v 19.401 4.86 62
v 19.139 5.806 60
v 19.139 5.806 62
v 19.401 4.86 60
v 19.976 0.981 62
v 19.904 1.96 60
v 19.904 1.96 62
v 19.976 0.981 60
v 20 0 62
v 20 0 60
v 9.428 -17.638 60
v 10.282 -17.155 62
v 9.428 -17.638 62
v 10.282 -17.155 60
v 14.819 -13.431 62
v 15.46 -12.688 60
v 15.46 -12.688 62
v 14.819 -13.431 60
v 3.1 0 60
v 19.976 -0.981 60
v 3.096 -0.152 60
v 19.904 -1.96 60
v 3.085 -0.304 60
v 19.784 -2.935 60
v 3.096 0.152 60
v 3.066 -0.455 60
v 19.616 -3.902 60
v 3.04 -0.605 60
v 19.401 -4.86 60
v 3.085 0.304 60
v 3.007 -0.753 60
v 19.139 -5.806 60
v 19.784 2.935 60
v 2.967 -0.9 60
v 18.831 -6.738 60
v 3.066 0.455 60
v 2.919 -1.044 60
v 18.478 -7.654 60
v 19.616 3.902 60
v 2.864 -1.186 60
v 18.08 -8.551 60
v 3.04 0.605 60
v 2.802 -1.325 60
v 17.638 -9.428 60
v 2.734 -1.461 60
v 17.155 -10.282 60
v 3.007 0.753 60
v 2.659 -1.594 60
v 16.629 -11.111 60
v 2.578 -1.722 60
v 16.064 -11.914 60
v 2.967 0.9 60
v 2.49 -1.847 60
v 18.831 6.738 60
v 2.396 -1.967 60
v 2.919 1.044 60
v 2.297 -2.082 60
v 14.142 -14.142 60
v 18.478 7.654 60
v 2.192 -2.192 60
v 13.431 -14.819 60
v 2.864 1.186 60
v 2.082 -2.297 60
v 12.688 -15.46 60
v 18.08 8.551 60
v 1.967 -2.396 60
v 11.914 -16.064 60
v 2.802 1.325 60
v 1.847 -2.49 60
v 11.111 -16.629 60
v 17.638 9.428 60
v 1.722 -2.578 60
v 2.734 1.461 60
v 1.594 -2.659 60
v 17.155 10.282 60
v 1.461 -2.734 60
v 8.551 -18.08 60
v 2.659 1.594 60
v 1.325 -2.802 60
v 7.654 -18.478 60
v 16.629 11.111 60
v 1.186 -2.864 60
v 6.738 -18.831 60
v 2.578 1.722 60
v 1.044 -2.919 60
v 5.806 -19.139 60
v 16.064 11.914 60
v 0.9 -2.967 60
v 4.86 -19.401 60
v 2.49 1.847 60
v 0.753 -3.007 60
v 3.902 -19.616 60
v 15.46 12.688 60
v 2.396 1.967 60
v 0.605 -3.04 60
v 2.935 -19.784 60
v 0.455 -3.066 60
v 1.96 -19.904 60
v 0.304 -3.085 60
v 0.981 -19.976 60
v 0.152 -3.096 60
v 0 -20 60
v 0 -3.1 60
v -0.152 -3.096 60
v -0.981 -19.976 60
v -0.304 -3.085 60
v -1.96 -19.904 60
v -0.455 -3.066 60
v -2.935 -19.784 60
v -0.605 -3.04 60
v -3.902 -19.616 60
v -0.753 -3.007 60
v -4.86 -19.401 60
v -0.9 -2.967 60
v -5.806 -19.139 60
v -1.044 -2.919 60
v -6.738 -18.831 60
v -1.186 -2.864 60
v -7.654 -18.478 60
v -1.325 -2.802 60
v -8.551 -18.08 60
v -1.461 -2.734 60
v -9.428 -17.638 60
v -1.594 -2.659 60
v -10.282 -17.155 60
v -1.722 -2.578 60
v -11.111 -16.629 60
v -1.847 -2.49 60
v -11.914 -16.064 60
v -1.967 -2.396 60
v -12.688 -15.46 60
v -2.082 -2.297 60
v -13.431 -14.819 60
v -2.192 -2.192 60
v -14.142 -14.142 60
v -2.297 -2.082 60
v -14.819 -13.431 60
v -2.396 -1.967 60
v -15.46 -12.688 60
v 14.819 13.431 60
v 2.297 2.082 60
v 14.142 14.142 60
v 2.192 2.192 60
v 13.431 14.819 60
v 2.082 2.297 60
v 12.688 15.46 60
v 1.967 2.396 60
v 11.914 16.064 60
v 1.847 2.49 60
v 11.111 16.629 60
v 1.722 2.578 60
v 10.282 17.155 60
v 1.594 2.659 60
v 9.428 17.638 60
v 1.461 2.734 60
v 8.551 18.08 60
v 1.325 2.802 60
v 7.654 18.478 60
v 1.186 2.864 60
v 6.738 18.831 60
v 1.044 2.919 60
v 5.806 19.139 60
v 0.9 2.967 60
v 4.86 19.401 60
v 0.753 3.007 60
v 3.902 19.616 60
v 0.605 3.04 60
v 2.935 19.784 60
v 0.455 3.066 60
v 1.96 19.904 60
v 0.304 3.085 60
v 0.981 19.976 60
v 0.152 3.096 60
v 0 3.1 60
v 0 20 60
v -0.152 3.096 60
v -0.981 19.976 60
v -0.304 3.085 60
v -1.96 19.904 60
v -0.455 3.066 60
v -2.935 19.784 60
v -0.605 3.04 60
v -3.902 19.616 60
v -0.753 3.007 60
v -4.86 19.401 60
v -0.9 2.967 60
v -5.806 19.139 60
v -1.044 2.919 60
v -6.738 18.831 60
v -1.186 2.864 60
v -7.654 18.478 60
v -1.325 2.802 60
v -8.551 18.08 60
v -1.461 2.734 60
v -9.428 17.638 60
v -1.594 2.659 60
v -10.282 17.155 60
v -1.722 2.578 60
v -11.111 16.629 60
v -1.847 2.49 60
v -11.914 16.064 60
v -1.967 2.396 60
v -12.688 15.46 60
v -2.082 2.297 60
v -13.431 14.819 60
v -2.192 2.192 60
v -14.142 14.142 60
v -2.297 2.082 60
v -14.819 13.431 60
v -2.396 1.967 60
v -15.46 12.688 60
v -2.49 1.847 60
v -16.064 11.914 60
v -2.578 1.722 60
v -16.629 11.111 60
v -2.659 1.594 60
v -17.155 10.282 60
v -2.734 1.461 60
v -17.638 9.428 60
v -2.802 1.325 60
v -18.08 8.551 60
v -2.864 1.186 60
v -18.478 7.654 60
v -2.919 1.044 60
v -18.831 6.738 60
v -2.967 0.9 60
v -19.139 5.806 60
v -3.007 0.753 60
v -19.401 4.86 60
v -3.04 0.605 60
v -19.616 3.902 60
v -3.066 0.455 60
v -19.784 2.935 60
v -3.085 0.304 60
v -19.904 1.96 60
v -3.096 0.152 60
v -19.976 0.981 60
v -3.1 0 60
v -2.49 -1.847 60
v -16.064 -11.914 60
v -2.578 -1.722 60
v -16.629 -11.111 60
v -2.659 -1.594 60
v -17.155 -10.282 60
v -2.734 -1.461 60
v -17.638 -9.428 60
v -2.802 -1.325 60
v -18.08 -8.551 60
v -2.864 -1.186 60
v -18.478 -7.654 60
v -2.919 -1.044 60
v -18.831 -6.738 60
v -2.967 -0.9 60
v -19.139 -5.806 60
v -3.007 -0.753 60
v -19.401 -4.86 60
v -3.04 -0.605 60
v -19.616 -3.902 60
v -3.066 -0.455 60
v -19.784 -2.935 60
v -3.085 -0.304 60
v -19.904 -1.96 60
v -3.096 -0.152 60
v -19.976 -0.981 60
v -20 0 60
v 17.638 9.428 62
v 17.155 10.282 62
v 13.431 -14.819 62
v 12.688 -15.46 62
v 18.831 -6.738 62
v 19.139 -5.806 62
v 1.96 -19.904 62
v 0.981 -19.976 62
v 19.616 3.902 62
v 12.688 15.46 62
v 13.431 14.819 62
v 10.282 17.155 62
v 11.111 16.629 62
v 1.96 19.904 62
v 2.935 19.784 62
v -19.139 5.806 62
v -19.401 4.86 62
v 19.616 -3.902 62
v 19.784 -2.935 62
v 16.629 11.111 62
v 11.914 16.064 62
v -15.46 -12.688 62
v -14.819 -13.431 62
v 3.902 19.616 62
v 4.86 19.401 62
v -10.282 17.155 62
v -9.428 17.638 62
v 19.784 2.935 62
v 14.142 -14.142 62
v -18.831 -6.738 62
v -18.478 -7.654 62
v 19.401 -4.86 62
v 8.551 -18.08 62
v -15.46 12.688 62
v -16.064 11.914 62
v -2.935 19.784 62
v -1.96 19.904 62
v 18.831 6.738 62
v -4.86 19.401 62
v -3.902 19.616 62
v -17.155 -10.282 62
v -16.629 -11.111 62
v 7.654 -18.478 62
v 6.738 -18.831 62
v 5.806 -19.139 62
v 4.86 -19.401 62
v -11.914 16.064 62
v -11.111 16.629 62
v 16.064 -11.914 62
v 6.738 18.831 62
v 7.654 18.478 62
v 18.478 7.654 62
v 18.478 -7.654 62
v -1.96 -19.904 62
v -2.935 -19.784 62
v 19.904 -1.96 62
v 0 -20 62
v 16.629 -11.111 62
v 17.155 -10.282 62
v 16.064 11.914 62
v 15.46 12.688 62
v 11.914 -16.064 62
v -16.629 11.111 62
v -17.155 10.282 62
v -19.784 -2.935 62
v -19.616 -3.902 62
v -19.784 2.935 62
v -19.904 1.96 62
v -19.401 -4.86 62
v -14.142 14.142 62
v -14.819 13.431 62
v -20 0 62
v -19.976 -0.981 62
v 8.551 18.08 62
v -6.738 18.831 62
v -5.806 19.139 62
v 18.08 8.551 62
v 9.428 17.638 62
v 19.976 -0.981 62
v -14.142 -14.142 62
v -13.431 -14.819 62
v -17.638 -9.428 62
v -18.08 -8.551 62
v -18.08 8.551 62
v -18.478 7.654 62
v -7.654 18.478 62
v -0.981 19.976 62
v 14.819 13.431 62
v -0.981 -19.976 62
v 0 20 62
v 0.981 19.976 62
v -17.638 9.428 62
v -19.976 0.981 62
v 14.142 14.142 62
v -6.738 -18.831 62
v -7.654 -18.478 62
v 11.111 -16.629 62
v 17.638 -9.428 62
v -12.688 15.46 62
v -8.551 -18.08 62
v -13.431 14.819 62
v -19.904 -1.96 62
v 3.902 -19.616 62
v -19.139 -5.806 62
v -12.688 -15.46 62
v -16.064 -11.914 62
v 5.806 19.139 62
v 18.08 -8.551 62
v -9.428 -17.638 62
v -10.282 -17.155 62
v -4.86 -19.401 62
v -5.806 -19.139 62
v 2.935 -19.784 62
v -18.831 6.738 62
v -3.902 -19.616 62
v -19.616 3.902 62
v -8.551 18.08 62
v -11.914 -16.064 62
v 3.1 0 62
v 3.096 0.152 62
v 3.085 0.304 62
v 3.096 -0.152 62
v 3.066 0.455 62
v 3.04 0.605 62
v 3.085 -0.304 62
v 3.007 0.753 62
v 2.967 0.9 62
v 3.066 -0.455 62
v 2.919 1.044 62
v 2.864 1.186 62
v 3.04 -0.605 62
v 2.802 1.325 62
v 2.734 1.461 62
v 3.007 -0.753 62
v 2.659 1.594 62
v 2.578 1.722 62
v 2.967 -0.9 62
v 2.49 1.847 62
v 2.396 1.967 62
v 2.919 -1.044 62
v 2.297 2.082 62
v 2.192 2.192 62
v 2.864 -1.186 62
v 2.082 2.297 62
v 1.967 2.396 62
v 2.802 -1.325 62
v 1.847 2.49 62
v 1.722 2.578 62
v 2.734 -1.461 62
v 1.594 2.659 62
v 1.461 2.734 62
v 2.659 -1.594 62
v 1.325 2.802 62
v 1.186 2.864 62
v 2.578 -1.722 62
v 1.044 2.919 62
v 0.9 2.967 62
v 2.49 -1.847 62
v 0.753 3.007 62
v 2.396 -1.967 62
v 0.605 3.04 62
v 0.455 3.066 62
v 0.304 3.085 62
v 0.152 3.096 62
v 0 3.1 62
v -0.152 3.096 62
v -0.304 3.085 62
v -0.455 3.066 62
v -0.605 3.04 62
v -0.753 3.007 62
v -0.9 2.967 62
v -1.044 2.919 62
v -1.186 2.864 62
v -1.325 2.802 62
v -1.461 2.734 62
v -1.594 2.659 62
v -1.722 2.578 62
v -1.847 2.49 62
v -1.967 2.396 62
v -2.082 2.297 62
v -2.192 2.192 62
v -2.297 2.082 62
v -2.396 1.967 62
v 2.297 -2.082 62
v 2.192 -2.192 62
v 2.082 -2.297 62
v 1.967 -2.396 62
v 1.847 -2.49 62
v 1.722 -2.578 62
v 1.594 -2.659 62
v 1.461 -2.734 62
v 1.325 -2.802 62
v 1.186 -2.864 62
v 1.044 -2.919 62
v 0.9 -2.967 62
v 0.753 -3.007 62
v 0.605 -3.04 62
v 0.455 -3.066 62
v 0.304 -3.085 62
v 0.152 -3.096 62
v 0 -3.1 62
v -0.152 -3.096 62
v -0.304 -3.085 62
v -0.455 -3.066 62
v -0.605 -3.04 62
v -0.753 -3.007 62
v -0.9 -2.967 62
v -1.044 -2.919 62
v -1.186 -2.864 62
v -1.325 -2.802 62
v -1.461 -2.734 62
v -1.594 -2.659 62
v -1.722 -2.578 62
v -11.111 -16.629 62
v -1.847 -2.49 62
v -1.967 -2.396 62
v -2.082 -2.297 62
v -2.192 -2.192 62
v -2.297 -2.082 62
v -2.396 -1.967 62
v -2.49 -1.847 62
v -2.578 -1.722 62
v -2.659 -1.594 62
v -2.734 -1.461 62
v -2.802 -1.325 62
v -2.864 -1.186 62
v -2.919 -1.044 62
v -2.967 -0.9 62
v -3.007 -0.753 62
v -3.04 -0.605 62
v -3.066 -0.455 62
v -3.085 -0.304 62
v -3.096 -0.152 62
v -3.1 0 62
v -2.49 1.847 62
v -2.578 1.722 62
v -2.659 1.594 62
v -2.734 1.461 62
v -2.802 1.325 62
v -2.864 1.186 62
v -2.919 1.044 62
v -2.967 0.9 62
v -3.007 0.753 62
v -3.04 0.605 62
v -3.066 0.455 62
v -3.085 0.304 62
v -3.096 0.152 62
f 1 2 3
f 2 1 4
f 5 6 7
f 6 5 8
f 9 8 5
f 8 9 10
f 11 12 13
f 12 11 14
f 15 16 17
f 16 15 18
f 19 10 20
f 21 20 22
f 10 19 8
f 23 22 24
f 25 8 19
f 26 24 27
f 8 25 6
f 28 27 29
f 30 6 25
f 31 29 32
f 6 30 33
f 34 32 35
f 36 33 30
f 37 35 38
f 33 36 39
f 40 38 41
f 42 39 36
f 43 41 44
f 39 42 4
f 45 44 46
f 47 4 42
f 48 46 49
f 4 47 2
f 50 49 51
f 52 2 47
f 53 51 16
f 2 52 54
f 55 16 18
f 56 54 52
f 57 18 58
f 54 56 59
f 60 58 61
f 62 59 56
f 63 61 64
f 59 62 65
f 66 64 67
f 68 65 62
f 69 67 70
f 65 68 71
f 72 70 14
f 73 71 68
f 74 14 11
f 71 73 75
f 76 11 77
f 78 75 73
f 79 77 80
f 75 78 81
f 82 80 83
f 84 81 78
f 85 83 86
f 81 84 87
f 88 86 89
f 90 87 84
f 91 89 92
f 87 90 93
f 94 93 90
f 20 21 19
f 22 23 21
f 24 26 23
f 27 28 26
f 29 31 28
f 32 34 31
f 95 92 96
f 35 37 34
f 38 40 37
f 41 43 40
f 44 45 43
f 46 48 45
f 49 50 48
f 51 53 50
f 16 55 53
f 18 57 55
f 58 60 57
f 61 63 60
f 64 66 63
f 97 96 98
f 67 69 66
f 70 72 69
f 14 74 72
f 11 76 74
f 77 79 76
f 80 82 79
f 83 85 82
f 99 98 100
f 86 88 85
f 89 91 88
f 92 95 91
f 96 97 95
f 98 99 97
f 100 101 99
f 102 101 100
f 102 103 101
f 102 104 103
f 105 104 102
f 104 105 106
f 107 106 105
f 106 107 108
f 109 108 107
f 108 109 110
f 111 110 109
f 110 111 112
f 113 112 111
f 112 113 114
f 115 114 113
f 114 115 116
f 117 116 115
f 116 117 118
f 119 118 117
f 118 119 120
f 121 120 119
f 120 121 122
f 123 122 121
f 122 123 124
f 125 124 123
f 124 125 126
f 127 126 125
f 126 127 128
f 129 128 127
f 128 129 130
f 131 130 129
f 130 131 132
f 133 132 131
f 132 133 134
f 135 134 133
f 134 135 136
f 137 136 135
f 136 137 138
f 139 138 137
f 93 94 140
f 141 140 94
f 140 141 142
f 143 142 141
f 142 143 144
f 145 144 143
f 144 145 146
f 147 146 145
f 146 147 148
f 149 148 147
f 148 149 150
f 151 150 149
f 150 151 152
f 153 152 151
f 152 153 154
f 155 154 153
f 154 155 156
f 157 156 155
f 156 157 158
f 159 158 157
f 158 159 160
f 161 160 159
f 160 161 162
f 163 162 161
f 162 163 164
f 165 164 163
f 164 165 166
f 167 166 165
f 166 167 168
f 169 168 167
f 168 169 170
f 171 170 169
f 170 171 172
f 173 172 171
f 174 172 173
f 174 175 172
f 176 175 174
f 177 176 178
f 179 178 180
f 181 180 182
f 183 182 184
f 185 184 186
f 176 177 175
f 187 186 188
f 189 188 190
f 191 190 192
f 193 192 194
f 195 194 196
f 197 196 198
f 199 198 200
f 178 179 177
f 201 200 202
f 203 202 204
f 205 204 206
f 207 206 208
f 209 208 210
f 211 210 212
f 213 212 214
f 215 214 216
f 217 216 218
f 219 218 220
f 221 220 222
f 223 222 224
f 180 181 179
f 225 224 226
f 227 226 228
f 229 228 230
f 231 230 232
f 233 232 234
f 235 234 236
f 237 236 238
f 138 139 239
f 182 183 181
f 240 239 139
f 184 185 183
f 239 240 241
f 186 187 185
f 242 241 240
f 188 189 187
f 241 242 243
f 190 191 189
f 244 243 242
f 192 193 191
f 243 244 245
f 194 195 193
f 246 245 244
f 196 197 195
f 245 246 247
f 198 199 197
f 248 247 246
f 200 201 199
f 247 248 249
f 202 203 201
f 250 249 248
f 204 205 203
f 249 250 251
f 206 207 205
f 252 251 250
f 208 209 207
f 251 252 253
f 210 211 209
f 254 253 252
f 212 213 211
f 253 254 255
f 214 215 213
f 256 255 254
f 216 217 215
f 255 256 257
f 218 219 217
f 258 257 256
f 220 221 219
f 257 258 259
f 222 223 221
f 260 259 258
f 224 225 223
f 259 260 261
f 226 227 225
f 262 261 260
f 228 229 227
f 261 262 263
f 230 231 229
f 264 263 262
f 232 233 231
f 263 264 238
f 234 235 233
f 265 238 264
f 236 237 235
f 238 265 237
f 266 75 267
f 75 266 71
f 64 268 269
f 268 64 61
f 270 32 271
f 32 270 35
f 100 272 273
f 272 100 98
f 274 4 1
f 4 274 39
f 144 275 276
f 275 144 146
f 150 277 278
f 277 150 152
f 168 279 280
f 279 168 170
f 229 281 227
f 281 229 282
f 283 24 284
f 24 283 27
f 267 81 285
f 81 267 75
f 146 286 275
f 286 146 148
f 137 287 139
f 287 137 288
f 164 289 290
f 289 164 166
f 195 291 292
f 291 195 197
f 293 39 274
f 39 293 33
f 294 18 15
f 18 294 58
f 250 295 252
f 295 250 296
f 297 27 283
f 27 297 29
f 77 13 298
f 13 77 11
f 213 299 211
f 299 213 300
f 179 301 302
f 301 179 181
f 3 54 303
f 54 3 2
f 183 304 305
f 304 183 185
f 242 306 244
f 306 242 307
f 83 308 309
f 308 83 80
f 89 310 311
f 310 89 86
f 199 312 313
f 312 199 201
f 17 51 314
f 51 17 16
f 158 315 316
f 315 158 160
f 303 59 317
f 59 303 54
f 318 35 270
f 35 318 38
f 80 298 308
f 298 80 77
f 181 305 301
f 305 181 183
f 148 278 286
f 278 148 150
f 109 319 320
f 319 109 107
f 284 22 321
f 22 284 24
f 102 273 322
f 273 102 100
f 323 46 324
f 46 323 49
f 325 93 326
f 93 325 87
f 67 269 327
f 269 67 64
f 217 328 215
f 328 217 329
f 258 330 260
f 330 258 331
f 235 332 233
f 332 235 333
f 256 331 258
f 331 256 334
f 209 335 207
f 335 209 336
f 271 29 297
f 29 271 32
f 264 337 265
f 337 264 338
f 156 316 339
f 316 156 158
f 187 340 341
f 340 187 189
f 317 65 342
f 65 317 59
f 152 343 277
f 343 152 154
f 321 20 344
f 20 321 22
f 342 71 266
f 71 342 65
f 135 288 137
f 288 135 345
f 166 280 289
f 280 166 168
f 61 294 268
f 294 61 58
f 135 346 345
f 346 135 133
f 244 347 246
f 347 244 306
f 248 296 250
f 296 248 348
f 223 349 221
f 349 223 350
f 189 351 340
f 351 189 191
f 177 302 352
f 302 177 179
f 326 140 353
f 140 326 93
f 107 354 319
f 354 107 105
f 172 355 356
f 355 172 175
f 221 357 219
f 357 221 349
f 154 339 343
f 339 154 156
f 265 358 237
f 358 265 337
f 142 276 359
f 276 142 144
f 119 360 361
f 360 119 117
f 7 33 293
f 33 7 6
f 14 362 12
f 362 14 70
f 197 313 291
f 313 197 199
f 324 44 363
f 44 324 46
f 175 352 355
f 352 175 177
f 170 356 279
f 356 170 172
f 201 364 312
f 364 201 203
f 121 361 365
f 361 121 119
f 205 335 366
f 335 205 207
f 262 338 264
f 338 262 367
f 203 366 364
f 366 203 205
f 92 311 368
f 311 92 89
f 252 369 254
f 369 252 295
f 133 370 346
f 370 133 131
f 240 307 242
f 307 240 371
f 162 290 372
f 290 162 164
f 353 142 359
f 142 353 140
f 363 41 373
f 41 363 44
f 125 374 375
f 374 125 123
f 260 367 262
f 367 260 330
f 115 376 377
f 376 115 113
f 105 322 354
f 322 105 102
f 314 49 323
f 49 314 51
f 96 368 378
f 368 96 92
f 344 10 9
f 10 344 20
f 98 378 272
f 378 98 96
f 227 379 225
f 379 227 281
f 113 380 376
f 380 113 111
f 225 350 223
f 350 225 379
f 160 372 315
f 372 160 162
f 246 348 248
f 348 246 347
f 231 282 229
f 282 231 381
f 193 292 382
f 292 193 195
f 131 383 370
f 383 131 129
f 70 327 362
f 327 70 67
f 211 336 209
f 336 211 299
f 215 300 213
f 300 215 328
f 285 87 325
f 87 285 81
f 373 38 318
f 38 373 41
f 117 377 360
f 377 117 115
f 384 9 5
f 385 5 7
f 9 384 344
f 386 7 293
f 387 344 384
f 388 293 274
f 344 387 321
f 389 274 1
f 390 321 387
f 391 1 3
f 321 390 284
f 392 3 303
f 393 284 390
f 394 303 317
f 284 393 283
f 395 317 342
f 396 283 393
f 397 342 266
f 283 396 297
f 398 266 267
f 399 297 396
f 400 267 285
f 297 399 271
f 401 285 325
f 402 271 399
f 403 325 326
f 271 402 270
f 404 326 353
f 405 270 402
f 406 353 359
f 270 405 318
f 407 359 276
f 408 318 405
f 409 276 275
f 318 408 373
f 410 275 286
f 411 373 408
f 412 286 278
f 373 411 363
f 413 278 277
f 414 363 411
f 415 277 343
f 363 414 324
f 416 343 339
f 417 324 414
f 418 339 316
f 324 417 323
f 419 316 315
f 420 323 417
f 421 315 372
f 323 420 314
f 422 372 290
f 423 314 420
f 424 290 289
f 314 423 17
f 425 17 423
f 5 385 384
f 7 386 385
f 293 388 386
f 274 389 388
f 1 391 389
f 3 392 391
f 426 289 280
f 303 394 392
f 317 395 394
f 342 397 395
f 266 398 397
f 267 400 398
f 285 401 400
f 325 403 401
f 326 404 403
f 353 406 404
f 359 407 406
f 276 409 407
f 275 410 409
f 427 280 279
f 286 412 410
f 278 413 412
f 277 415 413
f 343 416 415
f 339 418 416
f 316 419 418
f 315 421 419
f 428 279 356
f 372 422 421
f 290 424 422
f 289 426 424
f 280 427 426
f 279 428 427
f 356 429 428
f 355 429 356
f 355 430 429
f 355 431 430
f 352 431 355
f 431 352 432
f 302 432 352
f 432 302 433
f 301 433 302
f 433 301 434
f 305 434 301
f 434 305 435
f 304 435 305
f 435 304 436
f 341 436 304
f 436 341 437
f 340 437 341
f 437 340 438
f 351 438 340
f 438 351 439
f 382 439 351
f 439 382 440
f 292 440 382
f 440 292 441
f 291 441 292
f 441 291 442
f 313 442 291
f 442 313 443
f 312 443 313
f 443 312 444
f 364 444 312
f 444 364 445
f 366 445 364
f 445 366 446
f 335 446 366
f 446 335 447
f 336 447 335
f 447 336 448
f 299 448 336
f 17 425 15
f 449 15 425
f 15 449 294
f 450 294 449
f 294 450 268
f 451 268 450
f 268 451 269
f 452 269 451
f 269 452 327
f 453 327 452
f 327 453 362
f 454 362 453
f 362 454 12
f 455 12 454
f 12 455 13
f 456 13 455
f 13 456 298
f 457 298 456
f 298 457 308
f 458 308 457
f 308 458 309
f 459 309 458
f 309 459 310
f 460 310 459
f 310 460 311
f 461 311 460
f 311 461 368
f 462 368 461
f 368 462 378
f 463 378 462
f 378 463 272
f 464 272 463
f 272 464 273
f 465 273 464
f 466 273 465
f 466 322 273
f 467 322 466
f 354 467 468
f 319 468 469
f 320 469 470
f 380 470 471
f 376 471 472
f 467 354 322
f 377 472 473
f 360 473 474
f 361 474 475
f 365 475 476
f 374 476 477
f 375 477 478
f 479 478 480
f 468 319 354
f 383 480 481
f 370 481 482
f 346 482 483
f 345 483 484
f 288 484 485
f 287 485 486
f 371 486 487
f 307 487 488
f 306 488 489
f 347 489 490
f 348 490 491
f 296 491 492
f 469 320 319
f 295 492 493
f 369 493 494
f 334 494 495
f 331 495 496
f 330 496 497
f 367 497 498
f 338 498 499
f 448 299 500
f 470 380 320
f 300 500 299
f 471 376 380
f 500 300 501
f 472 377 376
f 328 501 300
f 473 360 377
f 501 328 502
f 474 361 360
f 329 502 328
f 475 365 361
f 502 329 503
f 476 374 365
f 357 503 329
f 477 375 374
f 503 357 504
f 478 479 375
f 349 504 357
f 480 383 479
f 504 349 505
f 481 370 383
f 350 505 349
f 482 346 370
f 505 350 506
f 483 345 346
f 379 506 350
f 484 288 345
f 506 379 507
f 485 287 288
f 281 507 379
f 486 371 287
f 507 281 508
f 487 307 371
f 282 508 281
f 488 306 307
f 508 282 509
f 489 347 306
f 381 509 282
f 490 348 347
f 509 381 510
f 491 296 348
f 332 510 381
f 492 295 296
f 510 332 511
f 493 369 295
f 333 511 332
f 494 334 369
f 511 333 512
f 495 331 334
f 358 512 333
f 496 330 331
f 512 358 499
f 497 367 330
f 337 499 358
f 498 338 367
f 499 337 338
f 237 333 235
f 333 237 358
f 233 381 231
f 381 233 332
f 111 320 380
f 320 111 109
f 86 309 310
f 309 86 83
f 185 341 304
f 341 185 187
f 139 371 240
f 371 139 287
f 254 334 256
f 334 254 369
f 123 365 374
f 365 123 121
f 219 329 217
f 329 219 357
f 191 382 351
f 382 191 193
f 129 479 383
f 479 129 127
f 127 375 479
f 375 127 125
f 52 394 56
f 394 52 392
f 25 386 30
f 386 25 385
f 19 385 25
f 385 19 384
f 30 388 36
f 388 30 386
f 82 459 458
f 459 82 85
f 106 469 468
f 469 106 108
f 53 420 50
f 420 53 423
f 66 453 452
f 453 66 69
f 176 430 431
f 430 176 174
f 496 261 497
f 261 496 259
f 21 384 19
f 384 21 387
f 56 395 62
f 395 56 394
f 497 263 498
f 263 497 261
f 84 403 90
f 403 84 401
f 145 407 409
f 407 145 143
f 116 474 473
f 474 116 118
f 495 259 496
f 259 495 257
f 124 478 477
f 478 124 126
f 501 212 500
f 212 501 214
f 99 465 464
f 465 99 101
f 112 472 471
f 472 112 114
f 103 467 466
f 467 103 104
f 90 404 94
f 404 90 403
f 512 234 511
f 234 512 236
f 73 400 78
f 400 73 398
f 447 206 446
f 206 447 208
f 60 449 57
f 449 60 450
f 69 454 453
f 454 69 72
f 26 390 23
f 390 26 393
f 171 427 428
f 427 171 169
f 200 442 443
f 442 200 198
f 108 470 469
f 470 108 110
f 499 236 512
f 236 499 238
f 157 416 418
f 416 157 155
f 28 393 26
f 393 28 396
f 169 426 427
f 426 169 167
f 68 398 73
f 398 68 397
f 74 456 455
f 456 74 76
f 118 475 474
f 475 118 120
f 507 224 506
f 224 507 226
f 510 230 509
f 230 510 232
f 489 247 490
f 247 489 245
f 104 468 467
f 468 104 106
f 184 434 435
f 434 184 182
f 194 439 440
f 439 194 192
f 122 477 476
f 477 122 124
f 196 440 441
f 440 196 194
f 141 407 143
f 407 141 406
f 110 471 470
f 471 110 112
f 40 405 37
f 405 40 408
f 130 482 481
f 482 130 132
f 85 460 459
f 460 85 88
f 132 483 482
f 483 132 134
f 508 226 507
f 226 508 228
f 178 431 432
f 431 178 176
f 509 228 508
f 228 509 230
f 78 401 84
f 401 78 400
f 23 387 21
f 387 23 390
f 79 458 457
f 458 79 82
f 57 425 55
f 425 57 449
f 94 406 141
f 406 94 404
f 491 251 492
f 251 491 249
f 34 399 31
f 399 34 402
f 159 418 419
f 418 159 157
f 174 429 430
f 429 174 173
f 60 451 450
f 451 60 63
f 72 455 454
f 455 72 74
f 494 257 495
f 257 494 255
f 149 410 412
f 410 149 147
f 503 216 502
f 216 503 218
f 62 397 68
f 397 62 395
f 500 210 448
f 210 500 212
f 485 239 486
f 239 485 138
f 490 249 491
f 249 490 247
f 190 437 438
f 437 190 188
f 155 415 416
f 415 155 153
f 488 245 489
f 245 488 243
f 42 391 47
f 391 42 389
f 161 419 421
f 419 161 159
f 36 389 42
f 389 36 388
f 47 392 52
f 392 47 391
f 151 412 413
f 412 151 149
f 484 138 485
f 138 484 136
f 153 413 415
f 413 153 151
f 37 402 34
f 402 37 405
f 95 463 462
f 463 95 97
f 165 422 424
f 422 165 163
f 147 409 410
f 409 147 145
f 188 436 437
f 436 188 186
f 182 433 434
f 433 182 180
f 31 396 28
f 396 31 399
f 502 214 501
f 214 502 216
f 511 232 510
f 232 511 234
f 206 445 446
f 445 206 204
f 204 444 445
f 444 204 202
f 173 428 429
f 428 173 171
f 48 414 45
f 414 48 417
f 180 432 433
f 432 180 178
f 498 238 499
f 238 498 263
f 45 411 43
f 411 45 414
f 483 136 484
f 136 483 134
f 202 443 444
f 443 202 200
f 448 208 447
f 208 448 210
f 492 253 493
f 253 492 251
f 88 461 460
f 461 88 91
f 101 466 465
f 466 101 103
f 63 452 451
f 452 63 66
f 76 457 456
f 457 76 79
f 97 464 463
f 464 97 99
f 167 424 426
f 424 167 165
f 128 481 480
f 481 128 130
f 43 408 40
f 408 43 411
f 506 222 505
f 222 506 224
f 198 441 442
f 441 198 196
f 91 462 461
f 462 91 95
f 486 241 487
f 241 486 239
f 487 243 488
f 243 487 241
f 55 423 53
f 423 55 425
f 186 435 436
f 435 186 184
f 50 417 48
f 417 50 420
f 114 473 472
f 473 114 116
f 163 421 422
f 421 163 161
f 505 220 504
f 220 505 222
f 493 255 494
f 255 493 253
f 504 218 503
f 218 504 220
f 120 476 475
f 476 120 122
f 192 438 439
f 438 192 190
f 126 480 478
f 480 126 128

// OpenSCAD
// file: common_params.scad
cylinder_radius = 20.000000;
cylinder_height = 60.000000;
wall_thickness = 2.000000;

cap_thickness = 2.000000;

rod_radius = 2.000000;
rod_height = 50.000000;

ring_outer_radius = 8.000000;
ring_inner_radius = 4.000000;
ring_thickness = 3.000000;
ring_z = 40.000000;

$fn = 128;
// main file
include <common_params.scad>;

hole_radius = 3.100000;

translate([0, 0, cylinder_height])
difference() {
    cylinder(h = cap_thickness, r = cylinder_radius);
    translate([0, 0, -0.1])
        cylinder(h = cap_thickness + 0.2, r = hole_radius);
}
